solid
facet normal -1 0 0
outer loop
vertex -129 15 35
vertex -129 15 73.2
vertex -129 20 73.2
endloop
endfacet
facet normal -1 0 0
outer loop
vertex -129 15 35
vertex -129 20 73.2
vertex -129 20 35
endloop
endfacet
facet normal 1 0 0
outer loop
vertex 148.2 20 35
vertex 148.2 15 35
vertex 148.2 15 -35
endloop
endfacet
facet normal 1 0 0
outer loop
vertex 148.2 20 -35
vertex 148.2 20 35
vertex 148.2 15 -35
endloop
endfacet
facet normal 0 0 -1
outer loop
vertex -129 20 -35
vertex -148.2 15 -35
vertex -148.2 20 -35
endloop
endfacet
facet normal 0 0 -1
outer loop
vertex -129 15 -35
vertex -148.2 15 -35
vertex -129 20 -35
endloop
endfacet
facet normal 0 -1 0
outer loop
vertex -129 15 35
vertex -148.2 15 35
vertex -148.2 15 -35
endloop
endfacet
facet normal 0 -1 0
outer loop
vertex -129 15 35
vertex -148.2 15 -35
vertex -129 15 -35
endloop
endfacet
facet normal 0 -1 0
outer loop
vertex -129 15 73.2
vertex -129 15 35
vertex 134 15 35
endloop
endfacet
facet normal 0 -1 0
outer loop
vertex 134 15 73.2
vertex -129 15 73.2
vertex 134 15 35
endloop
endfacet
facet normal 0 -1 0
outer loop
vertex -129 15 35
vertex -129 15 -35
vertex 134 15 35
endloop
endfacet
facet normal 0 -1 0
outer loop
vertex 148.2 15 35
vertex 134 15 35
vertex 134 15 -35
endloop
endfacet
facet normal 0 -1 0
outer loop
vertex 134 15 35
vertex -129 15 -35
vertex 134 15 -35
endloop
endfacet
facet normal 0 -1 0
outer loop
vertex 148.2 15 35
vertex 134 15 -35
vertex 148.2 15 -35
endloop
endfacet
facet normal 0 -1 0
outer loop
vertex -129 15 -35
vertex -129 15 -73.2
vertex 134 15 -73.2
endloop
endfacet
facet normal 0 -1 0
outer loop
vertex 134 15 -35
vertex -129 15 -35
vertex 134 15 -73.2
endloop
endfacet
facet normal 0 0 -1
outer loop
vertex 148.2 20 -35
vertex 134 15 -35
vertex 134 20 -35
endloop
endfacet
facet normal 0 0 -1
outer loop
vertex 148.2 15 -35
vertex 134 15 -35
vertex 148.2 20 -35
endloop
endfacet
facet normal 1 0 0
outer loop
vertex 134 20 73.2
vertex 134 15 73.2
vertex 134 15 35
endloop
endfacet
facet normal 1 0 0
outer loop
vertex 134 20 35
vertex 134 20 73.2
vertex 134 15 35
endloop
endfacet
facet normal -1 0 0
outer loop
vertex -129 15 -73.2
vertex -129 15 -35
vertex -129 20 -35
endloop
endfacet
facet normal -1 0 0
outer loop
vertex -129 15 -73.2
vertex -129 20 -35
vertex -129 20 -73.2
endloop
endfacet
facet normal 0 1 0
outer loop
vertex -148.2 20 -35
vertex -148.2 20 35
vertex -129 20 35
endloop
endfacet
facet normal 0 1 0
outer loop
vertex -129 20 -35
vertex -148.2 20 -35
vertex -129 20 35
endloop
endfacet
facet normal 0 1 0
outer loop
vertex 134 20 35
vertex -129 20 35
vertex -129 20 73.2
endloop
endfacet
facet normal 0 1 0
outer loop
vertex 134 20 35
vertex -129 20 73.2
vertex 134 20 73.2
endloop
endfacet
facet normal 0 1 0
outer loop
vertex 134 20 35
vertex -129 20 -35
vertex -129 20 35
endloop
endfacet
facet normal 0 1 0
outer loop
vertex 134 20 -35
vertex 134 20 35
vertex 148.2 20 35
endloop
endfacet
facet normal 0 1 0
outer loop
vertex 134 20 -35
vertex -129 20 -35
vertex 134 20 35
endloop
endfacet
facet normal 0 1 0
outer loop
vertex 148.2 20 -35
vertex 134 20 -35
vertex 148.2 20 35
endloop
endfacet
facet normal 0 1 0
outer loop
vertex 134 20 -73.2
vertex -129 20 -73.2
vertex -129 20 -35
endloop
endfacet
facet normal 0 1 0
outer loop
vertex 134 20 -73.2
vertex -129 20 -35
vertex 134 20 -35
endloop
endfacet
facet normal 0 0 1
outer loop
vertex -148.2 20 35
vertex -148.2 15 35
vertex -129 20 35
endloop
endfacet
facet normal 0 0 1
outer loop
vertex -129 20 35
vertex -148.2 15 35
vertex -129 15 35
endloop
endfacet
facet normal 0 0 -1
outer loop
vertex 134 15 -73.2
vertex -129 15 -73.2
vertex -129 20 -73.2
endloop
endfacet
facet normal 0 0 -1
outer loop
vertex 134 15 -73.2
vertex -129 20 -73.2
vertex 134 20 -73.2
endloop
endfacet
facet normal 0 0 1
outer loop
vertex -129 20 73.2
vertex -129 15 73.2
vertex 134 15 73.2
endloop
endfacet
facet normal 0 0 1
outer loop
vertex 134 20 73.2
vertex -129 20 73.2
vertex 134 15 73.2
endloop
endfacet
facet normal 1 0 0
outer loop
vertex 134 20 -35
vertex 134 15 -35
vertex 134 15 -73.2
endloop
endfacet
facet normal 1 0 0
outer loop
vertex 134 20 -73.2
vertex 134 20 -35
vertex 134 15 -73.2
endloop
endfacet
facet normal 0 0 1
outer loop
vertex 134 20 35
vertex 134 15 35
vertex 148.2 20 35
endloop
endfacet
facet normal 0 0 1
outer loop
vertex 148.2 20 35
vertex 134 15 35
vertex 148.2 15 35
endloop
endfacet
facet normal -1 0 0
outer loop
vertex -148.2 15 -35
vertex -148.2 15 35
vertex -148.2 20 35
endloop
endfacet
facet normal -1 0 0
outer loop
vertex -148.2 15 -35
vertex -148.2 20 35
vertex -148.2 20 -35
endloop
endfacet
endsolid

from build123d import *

# Parameters (mm, degrees)
SKIZZE1_W                       = 19.2
SKIZZE1_H                       = 70
SKIZZE1_W_2                     = 263
SKIZZE1_H_2                     = 146.4
SKIZZE1_W_3                     = 14.2
AUFSATZ_LINEAR_AUSTRAGEN1_DEPTH = 5


with BuildPart() as part:
    # Skizze1 → Aufsatz-Linear austragen1 (new body)
    with BuildSketch(Plane(origin=(0, 15, 0), x_dir=(1, 0, 0), z_dir=(0, 1, 0))):
        with Locations((-138.6, 0)):
            Rectangle(SKIZZE1_W, SKIZZE1_H)
        with Locations((2.5, 0)):
            Rectangle(SKIZZE1_W_2, SKIZZE1_H_2)
        with Locations((141.1, 0)):
            Rectangle(SKIZZE1_W_3, SKIZZE1_H)
    extrude(amount=AUFSATZ_LINEAR_AUSTRAGEN1_DEPTH)


solid = part.part
